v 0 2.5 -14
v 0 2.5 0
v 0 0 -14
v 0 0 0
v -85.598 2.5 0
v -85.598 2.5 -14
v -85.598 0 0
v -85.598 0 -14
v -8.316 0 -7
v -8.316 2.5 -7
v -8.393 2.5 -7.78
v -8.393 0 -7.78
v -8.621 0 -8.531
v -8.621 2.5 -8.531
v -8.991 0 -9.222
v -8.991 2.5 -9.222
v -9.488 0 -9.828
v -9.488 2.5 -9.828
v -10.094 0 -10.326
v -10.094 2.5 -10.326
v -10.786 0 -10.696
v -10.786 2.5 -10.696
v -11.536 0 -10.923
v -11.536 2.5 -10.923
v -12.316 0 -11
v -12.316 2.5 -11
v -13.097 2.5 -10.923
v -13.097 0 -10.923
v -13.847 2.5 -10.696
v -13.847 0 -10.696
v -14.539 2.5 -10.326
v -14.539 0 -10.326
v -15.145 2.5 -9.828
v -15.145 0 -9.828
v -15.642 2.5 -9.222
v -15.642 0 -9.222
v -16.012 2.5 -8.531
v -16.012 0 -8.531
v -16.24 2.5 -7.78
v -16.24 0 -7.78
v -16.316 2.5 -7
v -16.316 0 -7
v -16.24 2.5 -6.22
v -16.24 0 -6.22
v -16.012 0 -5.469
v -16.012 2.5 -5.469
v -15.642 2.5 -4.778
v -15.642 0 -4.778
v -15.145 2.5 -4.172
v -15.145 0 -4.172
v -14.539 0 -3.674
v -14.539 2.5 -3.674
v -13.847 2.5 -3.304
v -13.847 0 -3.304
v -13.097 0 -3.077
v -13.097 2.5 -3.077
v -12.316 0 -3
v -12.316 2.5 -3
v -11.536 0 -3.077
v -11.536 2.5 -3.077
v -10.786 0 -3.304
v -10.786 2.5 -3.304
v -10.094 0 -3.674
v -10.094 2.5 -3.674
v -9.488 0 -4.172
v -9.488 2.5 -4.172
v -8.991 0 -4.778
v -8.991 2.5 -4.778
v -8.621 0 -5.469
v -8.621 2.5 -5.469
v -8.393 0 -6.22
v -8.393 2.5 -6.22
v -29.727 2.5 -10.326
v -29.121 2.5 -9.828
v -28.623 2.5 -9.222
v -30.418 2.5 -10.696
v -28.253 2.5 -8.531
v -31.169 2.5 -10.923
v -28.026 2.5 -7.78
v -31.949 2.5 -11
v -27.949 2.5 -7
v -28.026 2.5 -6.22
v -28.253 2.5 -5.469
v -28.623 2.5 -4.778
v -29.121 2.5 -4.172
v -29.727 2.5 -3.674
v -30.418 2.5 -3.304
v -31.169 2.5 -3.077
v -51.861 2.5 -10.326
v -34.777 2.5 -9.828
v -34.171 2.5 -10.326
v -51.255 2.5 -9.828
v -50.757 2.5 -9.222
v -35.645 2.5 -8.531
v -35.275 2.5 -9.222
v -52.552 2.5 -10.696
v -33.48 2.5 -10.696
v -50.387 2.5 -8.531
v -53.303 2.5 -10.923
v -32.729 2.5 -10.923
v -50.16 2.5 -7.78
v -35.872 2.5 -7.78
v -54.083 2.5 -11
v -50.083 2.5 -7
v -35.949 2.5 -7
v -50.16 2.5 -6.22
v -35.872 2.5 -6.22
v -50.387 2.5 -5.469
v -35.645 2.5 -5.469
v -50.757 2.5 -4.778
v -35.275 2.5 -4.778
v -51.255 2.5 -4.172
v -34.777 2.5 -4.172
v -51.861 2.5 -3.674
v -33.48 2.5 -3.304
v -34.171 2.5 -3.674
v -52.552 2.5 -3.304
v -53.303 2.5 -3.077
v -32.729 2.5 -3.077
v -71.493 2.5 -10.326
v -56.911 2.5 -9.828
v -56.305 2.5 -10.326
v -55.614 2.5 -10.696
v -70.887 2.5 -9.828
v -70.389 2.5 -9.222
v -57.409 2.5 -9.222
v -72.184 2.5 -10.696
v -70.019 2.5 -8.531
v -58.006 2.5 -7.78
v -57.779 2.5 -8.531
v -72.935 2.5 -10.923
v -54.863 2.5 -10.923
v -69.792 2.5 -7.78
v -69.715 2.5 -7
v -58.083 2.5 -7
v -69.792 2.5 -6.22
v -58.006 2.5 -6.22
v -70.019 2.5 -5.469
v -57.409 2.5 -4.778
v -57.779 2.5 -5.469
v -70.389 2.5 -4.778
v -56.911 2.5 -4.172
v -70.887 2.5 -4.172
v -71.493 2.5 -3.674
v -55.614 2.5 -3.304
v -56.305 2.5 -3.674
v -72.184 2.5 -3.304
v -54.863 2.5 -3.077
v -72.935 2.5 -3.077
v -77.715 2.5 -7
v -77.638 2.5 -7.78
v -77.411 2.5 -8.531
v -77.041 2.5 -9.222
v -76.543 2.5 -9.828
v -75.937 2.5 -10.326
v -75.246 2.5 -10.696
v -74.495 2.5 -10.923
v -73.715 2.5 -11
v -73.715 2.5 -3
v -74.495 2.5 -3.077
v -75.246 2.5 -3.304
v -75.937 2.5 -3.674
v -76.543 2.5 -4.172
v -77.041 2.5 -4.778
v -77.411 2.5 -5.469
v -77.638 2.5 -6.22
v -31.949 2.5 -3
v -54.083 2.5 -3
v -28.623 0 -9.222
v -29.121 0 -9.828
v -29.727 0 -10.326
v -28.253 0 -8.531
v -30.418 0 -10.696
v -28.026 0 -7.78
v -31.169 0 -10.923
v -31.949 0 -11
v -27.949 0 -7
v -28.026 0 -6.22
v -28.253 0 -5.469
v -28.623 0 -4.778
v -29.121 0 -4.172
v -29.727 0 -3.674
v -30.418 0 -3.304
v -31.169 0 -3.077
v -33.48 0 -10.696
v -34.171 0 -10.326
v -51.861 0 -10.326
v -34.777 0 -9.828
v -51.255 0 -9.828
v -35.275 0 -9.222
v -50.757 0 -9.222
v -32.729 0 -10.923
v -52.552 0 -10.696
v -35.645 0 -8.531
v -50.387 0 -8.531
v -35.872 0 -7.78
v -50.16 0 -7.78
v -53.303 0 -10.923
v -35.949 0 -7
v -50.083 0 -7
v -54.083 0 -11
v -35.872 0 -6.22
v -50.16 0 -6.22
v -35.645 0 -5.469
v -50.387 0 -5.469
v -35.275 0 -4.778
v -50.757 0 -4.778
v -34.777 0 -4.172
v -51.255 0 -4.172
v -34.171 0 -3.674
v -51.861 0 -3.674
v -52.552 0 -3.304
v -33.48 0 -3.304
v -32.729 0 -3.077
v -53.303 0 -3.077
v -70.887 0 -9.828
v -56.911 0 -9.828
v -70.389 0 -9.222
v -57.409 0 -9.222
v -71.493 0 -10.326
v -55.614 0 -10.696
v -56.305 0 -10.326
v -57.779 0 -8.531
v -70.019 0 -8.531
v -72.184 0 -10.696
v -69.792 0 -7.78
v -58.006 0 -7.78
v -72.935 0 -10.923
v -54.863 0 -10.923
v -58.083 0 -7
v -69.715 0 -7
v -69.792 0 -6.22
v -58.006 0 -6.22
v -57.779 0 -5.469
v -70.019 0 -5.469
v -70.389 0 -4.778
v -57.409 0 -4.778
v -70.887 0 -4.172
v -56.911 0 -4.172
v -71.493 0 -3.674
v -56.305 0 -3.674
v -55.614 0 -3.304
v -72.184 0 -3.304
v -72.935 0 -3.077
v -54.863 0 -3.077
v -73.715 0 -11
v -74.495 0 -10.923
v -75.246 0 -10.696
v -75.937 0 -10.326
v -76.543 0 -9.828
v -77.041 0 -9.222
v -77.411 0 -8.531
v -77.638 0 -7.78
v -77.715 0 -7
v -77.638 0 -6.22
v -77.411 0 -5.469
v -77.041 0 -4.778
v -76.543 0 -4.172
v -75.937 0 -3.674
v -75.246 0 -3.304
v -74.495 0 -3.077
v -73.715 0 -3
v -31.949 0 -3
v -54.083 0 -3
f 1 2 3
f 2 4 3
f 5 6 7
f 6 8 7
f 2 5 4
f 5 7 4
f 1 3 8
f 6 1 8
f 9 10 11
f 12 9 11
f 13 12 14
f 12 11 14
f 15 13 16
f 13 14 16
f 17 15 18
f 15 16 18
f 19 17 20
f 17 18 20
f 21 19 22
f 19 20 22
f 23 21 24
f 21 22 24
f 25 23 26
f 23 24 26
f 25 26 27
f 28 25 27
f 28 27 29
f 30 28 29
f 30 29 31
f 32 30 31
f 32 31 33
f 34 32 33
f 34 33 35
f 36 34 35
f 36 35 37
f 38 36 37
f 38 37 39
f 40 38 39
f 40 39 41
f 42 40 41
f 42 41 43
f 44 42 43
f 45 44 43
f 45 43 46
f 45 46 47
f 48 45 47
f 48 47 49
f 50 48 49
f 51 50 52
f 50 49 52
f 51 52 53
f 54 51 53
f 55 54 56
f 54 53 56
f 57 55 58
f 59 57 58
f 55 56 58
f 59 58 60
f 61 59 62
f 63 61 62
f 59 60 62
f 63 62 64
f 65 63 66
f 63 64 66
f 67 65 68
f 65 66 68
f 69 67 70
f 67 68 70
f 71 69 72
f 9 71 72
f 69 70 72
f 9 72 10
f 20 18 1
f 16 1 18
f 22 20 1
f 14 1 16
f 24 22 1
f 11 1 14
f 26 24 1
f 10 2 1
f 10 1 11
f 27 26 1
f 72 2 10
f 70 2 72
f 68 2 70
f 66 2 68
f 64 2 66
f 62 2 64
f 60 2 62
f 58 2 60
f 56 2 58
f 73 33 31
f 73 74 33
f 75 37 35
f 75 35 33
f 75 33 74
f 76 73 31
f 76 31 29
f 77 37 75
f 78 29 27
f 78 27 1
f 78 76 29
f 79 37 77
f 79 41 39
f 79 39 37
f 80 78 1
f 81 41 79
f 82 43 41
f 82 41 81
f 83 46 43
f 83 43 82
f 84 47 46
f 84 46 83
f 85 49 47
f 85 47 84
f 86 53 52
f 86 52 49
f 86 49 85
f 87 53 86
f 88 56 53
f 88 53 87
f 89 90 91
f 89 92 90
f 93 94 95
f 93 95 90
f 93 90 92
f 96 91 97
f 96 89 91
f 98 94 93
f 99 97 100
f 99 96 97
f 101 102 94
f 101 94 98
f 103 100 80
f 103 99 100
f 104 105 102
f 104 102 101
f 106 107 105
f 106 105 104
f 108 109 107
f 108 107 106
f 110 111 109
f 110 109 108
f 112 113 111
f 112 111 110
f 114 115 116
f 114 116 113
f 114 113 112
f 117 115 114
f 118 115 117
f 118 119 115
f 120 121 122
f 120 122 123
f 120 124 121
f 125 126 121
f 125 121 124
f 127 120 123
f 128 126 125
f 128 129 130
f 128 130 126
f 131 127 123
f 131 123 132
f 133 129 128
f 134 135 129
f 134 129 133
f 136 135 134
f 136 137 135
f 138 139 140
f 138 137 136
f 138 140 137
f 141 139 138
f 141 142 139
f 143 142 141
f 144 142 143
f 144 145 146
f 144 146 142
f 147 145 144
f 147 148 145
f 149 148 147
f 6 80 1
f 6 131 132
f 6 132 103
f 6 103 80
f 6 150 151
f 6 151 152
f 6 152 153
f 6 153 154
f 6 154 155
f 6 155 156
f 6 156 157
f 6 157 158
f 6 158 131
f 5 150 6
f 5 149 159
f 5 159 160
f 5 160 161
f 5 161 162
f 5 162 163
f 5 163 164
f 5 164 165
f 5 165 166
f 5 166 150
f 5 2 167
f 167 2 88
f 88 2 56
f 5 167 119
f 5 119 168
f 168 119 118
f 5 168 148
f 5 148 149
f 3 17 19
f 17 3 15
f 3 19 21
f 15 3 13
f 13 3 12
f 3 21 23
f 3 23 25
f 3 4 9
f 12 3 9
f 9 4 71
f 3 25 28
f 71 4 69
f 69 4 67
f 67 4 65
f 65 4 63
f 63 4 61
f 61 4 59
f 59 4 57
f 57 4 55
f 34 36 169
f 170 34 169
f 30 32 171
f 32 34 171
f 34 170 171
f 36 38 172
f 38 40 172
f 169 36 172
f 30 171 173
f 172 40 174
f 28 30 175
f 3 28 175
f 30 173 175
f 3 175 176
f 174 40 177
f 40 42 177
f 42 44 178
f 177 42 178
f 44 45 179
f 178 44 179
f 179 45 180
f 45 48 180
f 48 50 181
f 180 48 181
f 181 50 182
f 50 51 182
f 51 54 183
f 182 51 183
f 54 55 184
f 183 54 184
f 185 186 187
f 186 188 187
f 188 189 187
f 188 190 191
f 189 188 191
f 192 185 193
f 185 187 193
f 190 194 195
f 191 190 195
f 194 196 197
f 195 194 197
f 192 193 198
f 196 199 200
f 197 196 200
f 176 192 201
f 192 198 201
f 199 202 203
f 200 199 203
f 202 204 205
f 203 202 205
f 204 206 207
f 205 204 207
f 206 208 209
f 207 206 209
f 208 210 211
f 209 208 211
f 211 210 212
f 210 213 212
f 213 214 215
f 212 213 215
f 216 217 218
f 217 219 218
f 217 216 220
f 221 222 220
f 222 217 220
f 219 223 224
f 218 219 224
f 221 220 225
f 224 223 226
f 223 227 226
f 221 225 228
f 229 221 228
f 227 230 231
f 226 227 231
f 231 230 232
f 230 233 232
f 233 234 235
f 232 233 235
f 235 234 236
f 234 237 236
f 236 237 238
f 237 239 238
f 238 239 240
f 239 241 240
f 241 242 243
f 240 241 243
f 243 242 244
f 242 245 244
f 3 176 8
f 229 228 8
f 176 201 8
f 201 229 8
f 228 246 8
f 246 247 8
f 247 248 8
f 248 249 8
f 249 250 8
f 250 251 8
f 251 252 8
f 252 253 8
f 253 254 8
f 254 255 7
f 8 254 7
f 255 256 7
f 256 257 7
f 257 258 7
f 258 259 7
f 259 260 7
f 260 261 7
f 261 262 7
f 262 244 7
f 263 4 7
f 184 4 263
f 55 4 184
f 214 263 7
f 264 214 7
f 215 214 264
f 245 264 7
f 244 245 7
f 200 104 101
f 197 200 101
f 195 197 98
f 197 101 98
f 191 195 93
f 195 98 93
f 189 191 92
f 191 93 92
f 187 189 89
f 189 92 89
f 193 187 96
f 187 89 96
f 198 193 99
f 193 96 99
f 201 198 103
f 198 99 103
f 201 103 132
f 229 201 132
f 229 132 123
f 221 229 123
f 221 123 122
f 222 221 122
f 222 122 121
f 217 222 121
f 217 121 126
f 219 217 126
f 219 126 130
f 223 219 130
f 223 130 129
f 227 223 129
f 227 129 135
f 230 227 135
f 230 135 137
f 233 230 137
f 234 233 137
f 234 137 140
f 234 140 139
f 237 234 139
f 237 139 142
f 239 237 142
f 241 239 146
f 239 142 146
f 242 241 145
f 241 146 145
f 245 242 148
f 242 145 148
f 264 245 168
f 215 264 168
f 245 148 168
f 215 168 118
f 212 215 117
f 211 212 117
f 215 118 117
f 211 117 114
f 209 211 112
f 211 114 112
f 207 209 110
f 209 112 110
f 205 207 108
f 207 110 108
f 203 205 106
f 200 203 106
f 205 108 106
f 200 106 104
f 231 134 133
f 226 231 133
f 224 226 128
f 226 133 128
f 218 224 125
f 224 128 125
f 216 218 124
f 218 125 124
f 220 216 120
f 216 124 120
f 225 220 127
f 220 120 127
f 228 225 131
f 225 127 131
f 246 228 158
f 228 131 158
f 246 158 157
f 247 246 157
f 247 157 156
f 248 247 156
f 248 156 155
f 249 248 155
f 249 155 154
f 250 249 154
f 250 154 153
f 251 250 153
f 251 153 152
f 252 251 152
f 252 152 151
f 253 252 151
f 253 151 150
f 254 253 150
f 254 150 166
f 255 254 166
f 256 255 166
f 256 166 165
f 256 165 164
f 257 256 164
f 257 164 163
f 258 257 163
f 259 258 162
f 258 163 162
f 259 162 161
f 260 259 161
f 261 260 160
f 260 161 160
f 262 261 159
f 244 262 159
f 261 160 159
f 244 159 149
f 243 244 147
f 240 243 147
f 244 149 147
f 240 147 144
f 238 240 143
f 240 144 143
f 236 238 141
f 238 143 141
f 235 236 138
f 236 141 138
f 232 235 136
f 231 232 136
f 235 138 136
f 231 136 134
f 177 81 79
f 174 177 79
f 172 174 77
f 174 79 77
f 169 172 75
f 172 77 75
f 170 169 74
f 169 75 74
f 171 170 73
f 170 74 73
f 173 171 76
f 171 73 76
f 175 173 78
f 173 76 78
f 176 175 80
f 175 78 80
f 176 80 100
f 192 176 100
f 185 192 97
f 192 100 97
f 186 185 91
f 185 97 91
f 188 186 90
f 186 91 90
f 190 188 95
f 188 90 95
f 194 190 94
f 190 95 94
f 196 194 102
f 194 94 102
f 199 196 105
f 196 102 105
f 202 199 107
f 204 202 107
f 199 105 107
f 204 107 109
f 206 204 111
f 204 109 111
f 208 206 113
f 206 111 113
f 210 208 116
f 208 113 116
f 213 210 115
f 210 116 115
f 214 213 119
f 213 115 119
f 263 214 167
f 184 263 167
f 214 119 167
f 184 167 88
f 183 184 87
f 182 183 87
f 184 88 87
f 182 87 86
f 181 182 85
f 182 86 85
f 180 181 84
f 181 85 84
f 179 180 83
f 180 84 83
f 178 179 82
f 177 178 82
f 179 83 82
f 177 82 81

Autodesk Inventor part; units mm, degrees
ref_plane "YZ Plane" through (0, 0, 0) normal (1, 0, 0) x (0, 1, 0)
ref_plane "XZ Plane" through (0, 0, 0) normal (0, 1, 0) x (-1, 0, 0)
ref_plane "XY Plane" through (0, 0, 0) normal (0, 0, 1) x (1, 0, 0)
sketch "Sketch1" plane through (0, 0, 0) normal (0, 1, 0) x (-1, 0, 0)
  line L0 (0, 0) -> (0, -14)
  line L1 (0, -14) -> (85.598, -14)
  line L2 (85.598, -14) -> (85.598, 0)
  line L3 (85.598, 0) -> (0, 0)
  dimension "d0" = 14
  dimension "d1" = 85.598
extrude "Extrusion1" add sketch "Sketch1" along normal blind 2.5
sketch "Sketch2" plane through (0, 2.5, 0) normal (0, 1, 0) x (1, 0, 0)
  line L0 (0, 0) -> (0, 14) projected
  line L1 (0, 14) -> (-85.598, 14) projected
  line L2 (-85.598, 0) -> (0, 0) projected
  circle A0 centre (-12.3165, 7) radius 4
  circle A1 centre (-31.949, 7) radius 4
  line L3 (0, 0) -> (-85.598, 0)
  line L4 (0, 24) -> (-2.5, 24)
  line L5 (-2.5, 24) -> (-41.766, 24)
  line L6 (-41.766, 24) -> (-44.266, 24)
  line L7 (-44.266, 24) -> (-54.083, 24)
  line L8 (-44.266, 24) -> (-83.532, 24)
  line L9 (-83.532, 24) -> (-73.715, 24)
  line L10 (-73.715, 24) -> (-73.715, -12)
  line L11 (-44.266, 24) -> (-44.266, -7)
  line L12 (-54.083, 24) -> (-54.083, -7)
  circle A2 centre (-54.083, 7) radius 4
  circle A3 centre (-73.715, 7) radius 4
  line L13 (-73.715, 7) -> (-12.3165, 7)
  dimension "d15" = 8
  dimension "d17" = 2.5
  dimension "d18" = 39.266
  dimension "d19" = 9.8165
  dimension "d20" = 9.817
  dimension "d21" = 2.5
  dimension "d22" = 9.817
  dimension "d23" = 39.266
  dimension "d24" = 9.817
  dimension "d25" = 8
  dimension "d27" = 8
extrude "Extrusion2" cut sketch "Sketch2" against normal blind 2.5 contours A0 | A1 L13 | L13 A1 | A2 L13 L12 | L12 L13 A2 | L13 L12 A2 | L12 L13 A2 | A3 L10 | L10 L13 A3 | A3 L13 L10
properties part number "Estructura Anillos" material "MDF Medium Density Fiberboard"
